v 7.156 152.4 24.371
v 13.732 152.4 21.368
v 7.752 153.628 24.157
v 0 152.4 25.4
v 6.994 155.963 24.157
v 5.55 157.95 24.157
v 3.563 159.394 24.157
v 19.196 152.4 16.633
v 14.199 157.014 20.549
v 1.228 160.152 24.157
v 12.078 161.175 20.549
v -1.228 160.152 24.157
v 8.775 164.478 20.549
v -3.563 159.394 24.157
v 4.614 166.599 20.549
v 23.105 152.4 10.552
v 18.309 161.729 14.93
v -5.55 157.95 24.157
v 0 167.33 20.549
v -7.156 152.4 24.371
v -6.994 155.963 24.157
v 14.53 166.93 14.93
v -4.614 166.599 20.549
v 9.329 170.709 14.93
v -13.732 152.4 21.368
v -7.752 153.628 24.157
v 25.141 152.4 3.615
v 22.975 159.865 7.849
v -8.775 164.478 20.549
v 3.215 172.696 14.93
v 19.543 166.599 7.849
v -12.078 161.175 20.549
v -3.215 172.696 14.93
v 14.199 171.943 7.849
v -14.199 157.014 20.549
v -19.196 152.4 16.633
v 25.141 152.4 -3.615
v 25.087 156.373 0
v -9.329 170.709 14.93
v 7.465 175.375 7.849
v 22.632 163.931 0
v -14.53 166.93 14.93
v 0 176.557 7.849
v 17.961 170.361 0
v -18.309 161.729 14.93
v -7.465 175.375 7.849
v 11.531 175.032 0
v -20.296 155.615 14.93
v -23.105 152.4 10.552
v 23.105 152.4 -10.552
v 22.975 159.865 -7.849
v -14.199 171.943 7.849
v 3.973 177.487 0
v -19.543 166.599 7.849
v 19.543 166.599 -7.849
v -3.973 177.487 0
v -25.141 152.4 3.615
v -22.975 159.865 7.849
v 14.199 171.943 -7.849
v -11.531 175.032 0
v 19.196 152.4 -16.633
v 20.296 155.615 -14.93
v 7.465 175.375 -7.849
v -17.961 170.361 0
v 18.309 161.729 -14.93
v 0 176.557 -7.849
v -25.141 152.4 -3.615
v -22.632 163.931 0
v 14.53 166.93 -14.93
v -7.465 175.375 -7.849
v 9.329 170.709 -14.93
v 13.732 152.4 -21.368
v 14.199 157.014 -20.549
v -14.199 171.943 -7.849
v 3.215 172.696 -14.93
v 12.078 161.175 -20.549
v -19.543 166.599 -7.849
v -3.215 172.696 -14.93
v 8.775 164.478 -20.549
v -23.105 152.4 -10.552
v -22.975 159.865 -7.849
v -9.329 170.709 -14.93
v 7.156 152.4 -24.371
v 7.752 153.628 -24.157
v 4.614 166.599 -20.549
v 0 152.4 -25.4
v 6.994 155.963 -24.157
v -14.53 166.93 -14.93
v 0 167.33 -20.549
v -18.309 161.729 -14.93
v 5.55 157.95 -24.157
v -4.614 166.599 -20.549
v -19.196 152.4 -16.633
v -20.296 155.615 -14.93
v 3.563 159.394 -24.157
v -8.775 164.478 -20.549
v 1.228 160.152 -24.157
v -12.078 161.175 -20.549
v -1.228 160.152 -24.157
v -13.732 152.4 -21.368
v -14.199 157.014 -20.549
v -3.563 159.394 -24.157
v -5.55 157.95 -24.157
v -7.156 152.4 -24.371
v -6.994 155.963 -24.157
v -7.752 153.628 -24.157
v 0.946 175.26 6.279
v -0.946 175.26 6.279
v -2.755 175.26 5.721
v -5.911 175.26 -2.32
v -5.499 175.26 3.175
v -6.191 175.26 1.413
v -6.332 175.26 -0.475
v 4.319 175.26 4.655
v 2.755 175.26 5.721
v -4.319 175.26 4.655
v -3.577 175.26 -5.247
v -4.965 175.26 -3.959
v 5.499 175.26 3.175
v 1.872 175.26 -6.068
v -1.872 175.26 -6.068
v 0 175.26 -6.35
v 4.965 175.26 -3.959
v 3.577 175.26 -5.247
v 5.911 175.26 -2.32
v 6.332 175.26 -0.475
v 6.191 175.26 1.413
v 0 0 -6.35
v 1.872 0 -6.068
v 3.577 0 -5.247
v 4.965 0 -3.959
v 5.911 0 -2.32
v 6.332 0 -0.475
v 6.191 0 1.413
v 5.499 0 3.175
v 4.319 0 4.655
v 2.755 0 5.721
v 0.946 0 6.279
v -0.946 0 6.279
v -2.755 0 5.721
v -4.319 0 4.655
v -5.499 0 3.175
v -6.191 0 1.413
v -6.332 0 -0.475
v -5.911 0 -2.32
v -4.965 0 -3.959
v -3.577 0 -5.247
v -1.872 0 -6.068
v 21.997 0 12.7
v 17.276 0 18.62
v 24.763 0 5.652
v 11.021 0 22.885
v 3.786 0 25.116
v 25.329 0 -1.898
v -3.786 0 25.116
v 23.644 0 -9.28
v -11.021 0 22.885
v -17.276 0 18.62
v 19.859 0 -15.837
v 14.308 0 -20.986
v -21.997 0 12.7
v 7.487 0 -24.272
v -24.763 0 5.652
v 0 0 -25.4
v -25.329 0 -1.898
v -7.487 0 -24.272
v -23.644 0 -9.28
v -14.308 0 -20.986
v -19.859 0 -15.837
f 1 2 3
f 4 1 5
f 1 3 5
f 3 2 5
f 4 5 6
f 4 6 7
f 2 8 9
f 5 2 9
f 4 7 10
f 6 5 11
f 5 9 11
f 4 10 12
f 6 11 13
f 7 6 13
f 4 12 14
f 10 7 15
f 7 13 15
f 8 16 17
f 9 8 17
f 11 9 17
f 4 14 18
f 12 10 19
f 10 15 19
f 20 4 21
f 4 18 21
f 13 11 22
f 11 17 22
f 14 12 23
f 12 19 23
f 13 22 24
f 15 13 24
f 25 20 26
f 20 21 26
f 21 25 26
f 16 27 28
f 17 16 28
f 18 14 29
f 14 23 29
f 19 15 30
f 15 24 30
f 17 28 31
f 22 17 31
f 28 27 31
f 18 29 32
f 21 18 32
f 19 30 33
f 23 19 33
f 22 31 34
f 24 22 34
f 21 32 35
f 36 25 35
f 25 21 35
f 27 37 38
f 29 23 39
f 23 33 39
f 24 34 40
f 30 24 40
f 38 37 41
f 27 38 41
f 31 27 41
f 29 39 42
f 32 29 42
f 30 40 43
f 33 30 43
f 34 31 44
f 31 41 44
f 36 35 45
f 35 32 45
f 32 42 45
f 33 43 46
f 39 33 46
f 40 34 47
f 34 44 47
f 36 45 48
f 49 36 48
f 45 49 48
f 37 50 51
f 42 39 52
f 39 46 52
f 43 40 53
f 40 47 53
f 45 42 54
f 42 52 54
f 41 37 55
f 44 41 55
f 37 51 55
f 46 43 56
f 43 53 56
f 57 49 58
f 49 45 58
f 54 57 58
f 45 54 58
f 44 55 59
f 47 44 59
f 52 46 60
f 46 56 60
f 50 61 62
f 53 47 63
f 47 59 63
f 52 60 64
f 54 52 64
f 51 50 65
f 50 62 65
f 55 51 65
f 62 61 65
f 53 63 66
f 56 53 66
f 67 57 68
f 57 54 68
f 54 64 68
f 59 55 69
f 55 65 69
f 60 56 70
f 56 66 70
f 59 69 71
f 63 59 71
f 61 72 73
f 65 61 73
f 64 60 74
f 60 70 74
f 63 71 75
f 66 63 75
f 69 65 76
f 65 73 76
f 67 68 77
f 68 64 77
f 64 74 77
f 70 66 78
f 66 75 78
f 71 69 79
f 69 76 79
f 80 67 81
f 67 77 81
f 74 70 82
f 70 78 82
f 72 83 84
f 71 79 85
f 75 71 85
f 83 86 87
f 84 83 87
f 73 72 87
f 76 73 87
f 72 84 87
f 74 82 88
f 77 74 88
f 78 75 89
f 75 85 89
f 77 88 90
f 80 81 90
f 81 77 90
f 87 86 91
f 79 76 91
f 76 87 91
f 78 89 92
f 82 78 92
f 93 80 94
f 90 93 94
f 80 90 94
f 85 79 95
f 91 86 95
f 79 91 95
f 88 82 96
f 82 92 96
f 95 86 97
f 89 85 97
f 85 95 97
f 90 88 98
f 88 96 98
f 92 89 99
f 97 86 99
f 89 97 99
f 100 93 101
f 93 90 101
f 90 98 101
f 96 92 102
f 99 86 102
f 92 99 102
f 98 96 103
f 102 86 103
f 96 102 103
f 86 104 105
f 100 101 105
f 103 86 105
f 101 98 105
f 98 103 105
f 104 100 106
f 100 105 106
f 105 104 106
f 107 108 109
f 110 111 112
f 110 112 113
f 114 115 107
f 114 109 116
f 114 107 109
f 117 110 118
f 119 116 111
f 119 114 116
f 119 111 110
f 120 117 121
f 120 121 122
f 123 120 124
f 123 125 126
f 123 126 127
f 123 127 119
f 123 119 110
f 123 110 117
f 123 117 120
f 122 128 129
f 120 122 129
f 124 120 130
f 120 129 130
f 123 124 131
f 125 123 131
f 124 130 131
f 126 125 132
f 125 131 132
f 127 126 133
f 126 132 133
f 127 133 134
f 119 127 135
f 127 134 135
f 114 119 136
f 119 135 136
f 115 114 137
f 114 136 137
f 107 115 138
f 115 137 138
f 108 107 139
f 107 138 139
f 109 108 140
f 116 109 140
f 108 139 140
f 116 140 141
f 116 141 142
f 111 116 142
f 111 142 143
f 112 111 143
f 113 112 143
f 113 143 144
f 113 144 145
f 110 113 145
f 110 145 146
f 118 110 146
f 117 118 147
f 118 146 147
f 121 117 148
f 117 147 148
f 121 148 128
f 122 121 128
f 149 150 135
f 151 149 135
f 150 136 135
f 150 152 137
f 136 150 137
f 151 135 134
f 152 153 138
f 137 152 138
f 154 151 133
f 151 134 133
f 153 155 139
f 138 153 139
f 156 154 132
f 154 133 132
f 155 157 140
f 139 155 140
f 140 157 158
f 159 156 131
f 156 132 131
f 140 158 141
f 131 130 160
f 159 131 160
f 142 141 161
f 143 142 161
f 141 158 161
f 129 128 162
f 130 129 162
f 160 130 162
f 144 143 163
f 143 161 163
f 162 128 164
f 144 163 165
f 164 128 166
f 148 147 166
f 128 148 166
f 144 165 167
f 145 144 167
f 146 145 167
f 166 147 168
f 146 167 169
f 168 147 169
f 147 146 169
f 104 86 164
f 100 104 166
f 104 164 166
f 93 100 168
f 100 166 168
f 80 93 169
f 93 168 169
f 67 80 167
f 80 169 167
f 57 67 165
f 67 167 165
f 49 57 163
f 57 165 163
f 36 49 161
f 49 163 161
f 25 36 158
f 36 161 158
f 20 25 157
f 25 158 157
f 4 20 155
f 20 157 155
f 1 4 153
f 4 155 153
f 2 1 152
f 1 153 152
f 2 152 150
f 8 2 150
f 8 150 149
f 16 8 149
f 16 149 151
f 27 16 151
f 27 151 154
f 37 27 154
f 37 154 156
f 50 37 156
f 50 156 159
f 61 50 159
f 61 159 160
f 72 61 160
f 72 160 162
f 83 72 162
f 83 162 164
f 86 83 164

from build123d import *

# Parameters (mm, degrees)
SKETCH1_R           = 25.4
BOSS_EXTRUDE1_DEPTH = 152.4
SKETCH4_R           = 6.35
CUT_EXTRUDE1_DEPTH  = 175.26


with BuildPart() as part:
    # Sketch1 → Boss-Extrude1 (new body)
    with BuildSketch(Plane(origin=(0, 0, 0), x_dir=(1, 0, 0), z_dir=(0, 1, 0))):
        with Locations(Location((0, 0, 0), (0, 0, 90))):
            Circle(SKETCH1_R)
    extrude(amount=BOSS_EXTRUDE1_DEPTH)

    # Sketch2 → Revolve1 (revolve)
    with BuildSketch(Plane(origin=(0, 152.4, 0), x_dir=(1, 0, 0), z_dir=(0, 1, 0))):
        with BuildLine():
            Line((0, 25.4), (0, -25.4))
            ThreePointArc((0, -25.4), (-25.4, 0), (0, 25.4))
        make_face()
    revolve(axis=Axis((0, 152.4, -25.4), (0, 0, 1)))

    # Sketch4 → Cut-Extrude1 (cut)
    with BuildSketch(Plane.XZ):
        with Locations(Location((0, 0, 0), (0, 0, 270))):
            Circle(SKETCH4_R)
    extrude(amount=-CUT_EXTRUDE1_DEPTH, mode=Mode.SUBTRACT)


solid = part.part
